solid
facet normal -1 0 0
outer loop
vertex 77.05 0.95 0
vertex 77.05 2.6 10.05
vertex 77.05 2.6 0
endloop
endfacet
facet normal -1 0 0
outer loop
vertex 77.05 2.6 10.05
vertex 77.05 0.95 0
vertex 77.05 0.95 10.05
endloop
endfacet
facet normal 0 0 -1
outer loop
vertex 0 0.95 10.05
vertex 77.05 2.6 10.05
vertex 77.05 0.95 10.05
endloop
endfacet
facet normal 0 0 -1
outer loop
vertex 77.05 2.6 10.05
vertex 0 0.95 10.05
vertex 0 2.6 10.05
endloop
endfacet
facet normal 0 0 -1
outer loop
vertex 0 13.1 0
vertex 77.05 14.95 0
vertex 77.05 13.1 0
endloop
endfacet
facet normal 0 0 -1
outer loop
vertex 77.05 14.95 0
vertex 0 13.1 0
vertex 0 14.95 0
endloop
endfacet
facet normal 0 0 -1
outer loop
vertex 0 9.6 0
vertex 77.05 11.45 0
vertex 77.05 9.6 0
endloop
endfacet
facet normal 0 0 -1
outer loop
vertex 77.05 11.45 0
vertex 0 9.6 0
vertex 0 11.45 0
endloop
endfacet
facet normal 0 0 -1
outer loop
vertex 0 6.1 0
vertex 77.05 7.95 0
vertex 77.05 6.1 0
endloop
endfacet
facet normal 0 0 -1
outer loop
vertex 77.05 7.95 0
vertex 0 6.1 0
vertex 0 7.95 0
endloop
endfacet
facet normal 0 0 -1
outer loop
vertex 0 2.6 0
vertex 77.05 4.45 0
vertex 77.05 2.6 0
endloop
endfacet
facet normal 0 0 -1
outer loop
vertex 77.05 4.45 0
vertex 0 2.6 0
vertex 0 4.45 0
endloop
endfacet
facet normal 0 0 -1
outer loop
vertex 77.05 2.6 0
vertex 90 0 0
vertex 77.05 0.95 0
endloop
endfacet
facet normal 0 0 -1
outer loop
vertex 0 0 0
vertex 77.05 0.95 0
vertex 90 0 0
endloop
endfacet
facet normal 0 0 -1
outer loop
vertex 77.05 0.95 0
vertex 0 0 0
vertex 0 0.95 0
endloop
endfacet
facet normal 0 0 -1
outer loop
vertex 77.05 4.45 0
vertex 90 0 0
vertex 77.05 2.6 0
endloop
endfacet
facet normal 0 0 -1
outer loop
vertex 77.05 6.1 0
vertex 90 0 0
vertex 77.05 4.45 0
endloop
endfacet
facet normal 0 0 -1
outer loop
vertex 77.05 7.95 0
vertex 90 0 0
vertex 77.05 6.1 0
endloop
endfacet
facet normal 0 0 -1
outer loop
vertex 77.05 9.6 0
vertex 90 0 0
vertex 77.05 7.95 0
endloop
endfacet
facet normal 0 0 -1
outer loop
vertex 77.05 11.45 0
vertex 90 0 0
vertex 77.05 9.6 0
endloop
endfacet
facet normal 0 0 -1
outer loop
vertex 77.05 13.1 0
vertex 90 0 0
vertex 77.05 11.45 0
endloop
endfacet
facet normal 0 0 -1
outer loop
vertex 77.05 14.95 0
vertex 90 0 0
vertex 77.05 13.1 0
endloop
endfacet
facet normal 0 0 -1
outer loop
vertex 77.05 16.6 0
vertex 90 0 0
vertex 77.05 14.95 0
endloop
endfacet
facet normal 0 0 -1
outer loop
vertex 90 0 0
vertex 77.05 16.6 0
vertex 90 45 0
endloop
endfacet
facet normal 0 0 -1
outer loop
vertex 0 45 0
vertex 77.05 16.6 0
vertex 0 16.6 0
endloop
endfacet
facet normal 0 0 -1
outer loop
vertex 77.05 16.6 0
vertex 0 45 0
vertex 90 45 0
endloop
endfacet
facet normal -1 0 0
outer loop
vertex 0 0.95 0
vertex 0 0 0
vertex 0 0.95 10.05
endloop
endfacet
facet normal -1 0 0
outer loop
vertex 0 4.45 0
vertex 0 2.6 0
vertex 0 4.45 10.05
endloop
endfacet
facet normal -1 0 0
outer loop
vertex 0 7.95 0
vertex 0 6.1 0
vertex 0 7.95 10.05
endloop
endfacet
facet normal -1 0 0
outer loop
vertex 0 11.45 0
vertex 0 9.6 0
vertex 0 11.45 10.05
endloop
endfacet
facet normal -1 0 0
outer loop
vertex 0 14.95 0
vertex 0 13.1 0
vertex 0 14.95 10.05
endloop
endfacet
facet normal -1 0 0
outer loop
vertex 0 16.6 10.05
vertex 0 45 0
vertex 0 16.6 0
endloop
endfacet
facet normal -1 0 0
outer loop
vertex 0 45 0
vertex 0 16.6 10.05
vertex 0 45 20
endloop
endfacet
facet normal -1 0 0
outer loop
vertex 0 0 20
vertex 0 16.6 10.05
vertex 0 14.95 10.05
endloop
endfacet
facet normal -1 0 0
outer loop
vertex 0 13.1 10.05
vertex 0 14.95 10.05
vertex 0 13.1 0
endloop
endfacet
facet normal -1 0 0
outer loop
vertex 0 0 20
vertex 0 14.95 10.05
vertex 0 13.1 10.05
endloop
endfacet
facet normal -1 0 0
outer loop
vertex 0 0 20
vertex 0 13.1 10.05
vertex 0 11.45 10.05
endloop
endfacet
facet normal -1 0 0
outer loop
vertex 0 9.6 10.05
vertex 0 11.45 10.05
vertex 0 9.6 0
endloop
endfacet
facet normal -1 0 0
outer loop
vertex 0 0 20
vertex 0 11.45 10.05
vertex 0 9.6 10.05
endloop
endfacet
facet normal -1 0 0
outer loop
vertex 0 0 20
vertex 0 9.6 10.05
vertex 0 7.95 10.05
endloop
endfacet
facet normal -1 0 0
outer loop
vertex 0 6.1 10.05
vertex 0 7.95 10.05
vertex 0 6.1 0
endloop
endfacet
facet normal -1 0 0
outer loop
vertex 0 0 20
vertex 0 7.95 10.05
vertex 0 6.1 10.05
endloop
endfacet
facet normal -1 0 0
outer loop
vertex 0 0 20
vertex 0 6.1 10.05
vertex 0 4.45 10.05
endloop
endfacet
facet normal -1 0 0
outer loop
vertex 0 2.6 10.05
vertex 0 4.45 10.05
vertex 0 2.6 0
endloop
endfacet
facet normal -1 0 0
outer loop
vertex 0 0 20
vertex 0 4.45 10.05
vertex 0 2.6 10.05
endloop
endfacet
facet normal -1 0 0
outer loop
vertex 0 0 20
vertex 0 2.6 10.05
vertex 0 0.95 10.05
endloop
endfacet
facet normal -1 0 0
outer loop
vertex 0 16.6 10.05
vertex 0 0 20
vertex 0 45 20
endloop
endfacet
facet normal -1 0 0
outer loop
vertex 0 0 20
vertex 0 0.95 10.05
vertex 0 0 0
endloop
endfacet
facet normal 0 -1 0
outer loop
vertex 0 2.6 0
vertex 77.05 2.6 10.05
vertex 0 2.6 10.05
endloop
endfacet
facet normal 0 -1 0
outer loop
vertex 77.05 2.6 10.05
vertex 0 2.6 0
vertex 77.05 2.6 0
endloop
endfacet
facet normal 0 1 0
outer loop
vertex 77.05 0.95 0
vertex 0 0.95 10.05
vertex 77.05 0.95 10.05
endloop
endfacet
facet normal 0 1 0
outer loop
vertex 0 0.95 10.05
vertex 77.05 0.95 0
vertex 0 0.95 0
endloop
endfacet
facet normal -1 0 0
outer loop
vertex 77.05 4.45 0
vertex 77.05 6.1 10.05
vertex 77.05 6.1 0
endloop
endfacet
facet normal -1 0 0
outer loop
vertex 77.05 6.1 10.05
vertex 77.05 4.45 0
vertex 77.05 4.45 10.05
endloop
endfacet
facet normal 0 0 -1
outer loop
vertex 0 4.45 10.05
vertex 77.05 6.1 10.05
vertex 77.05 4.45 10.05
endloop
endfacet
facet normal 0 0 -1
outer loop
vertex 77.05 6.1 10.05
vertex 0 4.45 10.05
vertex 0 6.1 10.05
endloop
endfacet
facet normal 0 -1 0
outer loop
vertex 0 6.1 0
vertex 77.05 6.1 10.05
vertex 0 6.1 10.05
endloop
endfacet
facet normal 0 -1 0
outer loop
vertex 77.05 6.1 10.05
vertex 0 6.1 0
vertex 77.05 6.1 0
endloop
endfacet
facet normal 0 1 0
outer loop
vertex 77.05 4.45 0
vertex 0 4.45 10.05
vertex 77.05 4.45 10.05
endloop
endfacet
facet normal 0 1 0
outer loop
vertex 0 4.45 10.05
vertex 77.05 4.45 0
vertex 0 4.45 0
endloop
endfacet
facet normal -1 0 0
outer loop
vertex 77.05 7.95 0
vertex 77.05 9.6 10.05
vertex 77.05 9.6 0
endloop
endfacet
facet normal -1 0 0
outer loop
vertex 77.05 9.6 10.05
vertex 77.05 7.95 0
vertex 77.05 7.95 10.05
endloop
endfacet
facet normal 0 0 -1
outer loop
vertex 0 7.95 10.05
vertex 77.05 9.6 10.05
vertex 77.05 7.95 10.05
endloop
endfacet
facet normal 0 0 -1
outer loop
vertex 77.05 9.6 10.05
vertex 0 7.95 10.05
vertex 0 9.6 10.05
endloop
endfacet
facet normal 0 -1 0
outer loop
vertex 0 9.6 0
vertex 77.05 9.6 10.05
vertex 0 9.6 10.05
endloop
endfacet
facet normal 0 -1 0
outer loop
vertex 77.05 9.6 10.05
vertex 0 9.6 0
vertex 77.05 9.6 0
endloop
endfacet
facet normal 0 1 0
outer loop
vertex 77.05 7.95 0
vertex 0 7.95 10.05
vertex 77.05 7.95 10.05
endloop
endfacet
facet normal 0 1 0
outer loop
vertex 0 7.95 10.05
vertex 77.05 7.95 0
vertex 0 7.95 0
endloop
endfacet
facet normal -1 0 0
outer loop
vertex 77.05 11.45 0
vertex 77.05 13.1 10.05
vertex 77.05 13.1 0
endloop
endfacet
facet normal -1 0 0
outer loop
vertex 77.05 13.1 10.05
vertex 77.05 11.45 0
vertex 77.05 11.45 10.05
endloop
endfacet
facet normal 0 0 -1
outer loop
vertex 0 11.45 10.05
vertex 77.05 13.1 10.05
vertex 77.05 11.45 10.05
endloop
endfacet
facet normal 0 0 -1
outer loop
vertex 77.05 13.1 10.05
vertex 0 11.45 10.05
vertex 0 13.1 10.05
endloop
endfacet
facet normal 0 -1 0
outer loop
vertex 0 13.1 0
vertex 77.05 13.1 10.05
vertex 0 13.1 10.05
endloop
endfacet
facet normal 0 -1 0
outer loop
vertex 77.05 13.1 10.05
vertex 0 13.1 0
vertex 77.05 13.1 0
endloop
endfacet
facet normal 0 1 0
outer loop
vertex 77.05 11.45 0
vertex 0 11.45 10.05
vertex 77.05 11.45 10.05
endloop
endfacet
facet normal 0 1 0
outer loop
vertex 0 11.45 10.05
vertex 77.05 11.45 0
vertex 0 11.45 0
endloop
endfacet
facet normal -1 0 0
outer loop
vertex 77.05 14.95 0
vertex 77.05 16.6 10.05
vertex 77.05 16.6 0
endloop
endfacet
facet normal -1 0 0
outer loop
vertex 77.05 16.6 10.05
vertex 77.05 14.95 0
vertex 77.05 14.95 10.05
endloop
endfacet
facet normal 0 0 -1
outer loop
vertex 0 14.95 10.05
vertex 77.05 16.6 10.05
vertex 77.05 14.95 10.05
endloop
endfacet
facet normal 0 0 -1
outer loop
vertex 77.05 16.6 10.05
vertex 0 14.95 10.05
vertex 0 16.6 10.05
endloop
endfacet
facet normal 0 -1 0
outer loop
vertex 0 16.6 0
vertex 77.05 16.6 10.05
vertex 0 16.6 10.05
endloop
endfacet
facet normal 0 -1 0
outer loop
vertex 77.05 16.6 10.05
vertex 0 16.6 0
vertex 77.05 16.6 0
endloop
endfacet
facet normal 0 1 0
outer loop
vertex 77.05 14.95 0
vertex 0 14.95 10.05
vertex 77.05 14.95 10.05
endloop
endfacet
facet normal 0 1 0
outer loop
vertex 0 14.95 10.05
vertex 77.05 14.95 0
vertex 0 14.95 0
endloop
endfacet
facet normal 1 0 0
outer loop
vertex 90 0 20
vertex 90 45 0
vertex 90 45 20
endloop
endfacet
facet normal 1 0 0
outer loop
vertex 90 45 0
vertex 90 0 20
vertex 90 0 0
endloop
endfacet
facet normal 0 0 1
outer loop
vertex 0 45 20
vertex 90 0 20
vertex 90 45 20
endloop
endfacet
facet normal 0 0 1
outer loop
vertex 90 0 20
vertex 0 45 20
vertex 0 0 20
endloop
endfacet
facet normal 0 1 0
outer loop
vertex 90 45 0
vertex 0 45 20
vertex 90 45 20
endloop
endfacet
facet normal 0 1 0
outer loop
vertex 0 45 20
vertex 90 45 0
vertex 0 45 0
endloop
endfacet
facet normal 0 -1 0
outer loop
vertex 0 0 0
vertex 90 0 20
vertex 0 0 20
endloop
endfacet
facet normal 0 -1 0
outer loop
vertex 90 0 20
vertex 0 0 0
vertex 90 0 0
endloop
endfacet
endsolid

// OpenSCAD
// Drying rack for 10 microscope slides.
// Base: 90 x 45 x 20 mm.
// Slots: 10 parallel slots along X, 77 mm long, 1.6 mm wide, 10 mm deep.
// Spacing: 3.5 mm centre-to-centre in Y, centred on the block.

// Base dimensions
L_base = 90;
W_base = 45;
H_base = 20;

// Slide dimensions (for reference)
slide_w = 25;
slide_h = 75;
slide_t = 1;

// Slot dimensions
slot_len = 77;
slot_w   = 1.6;
slot_d   = 10;

// Spacing
slot_spacing = 3.5;

// Tolerance for cutting
tol = 0.05;

$fn = 64;

// Calculate the Y position of the first slot centre.
// We have 10 slots. The group is centred on the block in Y.
// The distance from the block centre to the first slot centre is:
// (W_base / 2) - ( (n-1)/2 * spacing + slot_w/2 )
// Or simply: start_pos = - ( (n-1)*spacing/2 + slot_w/2 )
n_slots = 10;
y_start = - ( (n_slots - 1) * slot_spacing / 2 + slot_w / 2 );

difference() {
    // 1. Create the solid base block
    translate([0, 0, 0]) 
        cube([L_base, W_base, H_base]);

    // 2. Cut the 10 slots
    // Slots run along X, so we cut a long thin rectangle going into the block.
    // The slot is open at the top (Z=0) and goes down to Z = H_base - slot_d.
    // We extend the cut slightly past the bottom to ensure clean removal.
    for (i = [0 : n_slots - 1]) {
        // Calculate Y position for this slot
        y_pos = y_start + i * slot_spacing;
        
        // Define the cutting shape
        // It is a prism: length = slot_len + tolerance, width = slot_w + tolerance, height = slot_d + tolerance
        translate([0, y_pos, 0]) 
            cube([slot_len + tol, slot_w + tol, slot_d + tol]);
    }
}
